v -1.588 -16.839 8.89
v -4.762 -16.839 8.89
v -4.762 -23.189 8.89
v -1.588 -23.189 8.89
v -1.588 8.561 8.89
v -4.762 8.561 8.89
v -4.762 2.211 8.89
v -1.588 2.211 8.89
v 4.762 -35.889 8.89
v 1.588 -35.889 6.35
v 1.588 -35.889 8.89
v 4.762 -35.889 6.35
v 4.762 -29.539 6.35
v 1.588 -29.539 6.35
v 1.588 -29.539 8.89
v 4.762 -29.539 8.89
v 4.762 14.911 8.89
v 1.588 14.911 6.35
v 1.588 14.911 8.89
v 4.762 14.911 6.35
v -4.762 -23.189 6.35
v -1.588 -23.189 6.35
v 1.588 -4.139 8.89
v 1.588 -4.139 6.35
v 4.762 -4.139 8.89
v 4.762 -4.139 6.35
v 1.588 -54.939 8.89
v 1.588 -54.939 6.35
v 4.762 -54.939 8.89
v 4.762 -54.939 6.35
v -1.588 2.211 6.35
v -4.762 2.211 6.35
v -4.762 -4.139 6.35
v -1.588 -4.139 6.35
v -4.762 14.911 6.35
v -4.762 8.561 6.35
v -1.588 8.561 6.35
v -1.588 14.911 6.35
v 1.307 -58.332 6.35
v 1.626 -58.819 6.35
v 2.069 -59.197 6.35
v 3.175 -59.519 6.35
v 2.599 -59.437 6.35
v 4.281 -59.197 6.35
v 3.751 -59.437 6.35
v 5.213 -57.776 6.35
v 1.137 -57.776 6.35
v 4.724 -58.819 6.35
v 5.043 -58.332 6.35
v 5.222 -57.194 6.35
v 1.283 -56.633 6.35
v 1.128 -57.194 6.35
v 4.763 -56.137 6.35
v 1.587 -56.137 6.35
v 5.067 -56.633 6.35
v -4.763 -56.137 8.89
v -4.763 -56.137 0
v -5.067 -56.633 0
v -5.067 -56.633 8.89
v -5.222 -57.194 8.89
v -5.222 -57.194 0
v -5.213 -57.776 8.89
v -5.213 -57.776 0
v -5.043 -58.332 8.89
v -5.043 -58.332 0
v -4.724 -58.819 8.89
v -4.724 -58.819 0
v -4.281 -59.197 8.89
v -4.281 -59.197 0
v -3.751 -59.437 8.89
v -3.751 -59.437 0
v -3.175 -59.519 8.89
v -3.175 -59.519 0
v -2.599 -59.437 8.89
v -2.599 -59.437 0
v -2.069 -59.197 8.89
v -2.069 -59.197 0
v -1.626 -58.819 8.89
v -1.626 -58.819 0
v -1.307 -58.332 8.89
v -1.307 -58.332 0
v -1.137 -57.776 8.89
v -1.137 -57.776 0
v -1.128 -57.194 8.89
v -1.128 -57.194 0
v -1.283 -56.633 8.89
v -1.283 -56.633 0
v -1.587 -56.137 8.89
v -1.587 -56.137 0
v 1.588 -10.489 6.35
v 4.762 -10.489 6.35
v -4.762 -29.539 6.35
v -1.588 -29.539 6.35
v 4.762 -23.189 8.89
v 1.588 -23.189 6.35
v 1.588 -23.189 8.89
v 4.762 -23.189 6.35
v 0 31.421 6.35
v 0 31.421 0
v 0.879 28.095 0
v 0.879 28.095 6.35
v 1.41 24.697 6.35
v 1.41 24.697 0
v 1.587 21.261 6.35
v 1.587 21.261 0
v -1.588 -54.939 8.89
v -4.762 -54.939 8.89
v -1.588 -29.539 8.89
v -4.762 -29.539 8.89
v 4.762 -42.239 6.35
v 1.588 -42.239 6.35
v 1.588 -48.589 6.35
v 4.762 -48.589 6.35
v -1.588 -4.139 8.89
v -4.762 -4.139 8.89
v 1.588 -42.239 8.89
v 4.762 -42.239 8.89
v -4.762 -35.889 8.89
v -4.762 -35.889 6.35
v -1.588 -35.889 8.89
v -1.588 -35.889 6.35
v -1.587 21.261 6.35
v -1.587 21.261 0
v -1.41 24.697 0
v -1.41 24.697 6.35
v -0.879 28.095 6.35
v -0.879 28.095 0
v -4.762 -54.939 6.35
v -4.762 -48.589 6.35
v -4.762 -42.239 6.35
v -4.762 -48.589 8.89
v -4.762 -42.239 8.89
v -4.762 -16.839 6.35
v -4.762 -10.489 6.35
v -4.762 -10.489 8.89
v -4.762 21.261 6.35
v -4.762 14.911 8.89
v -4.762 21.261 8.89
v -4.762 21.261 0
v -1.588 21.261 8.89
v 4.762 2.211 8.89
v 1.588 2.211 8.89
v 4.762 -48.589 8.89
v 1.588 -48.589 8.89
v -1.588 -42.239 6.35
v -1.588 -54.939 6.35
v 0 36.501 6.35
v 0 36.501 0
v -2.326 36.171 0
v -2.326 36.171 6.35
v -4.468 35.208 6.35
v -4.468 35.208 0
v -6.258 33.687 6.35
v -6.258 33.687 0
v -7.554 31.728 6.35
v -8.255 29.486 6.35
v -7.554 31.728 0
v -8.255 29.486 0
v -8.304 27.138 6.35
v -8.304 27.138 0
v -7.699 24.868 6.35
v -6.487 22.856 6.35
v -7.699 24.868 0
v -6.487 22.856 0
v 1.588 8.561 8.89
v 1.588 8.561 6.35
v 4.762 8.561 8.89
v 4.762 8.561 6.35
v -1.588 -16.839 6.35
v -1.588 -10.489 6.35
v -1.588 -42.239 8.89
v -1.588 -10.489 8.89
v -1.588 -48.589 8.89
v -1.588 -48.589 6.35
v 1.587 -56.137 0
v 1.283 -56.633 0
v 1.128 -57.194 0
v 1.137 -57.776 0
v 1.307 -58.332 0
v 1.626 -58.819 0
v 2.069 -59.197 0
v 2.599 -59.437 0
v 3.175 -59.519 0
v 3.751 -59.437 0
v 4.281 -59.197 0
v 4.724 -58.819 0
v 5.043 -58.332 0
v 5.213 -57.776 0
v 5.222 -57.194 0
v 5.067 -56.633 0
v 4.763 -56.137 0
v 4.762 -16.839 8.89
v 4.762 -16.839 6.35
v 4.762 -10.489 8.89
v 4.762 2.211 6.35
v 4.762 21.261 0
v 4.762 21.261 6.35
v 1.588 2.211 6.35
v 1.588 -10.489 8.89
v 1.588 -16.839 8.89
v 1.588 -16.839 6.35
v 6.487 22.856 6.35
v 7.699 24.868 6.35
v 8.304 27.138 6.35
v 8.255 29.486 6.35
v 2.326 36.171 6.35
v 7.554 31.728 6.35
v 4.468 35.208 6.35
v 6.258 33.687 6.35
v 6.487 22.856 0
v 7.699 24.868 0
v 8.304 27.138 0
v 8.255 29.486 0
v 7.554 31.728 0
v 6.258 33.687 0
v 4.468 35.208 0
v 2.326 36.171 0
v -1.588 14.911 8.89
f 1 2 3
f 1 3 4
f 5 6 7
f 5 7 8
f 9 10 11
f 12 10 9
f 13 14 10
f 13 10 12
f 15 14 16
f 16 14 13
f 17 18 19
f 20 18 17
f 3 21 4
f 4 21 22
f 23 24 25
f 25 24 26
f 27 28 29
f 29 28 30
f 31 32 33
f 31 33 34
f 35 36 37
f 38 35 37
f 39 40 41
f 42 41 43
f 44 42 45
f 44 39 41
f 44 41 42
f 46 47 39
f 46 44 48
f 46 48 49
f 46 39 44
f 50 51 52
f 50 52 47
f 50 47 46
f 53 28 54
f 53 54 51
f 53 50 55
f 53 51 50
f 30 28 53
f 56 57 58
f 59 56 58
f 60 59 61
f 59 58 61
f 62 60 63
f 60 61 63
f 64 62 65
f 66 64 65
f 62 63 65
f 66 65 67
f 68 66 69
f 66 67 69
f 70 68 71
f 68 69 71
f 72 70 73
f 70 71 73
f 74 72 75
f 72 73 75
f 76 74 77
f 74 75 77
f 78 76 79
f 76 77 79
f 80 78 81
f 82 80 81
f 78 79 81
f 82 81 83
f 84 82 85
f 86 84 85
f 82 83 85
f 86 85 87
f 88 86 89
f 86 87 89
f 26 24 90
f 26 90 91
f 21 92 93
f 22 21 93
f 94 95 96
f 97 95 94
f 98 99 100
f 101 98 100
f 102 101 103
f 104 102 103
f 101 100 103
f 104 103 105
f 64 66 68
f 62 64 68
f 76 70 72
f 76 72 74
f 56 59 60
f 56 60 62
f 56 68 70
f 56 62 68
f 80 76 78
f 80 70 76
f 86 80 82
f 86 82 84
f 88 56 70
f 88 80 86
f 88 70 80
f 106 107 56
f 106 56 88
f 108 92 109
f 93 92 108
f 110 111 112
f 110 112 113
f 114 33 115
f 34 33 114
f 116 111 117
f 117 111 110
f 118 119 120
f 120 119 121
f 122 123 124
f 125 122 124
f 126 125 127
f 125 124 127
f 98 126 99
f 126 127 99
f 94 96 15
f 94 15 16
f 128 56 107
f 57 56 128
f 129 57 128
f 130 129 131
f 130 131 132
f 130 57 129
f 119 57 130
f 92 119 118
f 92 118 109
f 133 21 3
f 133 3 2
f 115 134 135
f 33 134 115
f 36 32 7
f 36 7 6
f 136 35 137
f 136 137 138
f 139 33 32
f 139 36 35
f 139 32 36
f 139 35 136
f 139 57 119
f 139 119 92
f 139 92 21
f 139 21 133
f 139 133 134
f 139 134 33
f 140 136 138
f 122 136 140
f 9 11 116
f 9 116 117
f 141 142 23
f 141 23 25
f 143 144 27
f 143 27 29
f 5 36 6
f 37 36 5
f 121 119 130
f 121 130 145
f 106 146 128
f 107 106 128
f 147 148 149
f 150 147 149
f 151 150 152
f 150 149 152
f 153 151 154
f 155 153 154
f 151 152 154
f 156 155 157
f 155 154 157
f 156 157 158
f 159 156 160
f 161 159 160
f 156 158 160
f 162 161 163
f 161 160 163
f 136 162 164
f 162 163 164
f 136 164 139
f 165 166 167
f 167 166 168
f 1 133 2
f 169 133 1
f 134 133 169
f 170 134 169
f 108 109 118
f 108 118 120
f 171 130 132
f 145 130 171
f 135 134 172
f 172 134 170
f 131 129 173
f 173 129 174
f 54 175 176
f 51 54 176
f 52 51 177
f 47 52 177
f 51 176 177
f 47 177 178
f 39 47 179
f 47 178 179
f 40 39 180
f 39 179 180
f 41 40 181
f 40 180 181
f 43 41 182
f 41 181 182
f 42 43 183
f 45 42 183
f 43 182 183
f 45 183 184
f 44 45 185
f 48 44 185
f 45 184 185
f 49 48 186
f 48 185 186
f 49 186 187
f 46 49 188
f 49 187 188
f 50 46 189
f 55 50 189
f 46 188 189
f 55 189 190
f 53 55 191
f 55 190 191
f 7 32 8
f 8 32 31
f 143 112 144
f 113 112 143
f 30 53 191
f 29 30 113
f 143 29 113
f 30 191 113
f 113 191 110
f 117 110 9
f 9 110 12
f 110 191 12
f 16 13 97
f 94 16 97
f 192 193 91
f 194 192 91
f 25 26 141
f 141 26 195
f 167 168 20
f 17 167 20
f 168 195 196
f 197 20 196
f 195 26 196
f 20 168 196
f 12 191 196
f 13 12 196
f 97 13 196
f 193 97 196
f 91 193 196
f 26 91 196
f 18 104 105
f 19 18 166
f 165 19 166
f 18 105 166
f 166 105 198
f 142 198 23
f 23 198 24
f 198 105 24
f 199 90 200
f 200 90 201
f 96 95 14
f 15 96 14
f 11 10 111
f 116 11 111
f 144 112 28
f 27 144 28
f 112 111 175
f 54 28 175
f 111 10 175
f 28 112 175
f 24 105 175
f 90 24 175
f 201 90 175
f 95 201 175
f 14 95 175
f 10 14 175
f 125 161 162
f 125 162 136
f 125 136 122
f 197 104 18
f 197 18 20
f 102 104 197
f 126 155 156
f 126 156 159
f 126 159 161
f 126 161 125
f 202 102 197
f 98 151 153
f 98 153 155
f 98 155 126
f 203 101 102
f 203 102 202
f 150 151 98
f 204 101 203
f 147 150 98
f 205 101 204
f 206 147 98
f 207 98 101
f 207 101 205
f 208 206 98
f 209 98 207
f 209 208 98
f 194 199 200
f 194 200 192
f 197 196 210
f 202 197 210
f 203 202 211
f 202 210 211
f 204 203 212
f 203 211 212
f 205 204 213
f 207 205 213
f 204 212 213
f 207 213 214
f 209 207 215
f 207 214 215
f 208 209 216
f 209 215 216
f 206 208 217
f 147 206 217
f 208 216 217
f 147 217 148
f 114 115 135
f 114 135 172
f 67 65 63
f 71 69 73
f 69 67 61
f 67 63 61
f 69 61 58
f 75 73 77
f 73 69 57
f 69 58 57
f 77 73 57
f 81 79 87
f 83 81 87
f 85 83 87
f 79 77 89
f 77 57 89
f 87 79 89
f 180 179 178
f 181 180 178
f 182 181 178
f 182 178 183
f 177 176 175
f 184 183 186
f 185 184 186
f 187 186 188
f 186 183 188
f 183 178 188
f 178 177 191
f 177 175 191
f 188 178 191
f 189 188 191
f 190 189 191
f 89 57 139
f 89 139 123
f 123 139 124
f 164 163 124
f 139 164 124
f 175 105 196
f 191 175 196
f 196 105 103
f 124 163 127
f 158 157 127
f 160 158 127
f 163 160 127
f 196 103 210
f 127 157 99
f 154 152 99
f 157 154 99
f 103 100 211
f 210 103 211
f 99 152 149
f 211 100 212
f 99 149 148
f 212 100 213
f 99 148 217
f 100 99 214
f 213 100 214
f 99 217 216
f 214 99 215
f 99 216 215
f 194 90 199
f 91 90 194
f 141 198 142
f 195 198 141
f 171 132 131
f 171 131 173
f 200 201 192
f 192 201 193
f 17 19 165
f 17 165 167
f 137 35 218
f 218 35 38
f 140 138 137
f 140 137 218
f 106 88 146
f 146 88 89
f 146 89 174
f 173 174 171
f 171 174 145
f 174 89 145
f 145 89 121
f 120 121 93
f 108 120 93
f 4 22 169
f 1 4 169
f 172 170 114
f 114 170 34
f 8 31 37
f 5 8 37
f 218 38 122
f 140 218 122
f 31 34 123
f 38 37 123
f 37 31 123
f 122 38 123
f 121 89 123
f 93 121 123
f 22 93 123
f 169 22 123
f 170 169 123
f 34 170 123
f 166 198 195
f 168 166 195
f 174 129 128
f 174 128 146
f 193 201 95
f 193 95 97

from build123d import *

# Parameters (mm, degrees)
F1_DEPTH = 6.35
F2_W     = 3.175
F2_H     = 6.35
F2_H_2   = 6.349999
F2_H_3   = 6.350001
F3_DEPTH = 2.54


with BuildPart() as f1:
    # F0 (on Top) → F1 (new body)
    with BuildSketch(Plane.XY):
        with BuildLine():
            Line((0, 36.501117), (0, 31.421117))
            ThreePointArc((0, 31.421117), (1.188232, 26.402755), (1.5875, 21.261117))
            Line((1.5875, 21.261117), (1.5875, -56.137312))
            ThreePointArc((1.5875, -56.137312), (3.175, -59.518786), (4.7625, -56.137312))
            Line((4.7625, -56.137312), (4.7625, 21.261117))
            ThreePointArc((4.7625, 21.261117), (7.983405, 30.631791), (0, 36.501117))
        make_face()
        with BuildLine():
            ThreePointArc((-1.5875, 21.261117), (-1.188232, 26.402755), (0, 31.421117))
            Line((0, 31.421117), (0, 36.501117))
            ThreePointArc((0, 36.501117), (-7.983405, 30.631791), (-4.7625, 21.261117))
            Line((-4.7625, 21.261117), (-4.7625, -56.137312))
            ThreePointArc((-4.7625, -56.137312), (-3.175, -59.518786), (-1.5875, -56.137312))
            Line((-1.5875, -56.137312), (-1.5875, 21.261117))
        make_face()
    extrude(amount=F1_DEPTH)

    # F2 (on face) → F3 (join)
    with BuildSketch(Plane.XY.offset(6.35)):
        with Locations((-3.175, 18.086117)):
            Rectangle(F2_W, F2_H)
        with Locations((3.175, 11.736117)):
            Rectangle(F2_W, F2_H)
        with Locations((-3.175, 5.386117)):
            Rectangle(F2_W, F2_H)
        with Locations((3.175, -0.963883)):
            Rectangle(F2_W, F2_H)
        with Locations((-3.175, -7.313883)):
            Rectangle(F2_W, F2_H)
        with Locations((3.175, -13.663883)):
            Rectangle(F2_W, F2_H)
        with Locations((-3.175, -20.013883)):
            Rectangle(F2_W, F2_H)
        with Locations((3.175, -26.363883)):
            Rectangle(F2_W, F2_H)
        with Locations((-3.175, -32.713883)):
            Rectangle(F2_W, F2_H)
        with Locations((3.175, -39.063883)):
            Rectangle(F2_W, F2_H)
        with Locations((-3.175, -45.413882)):
            Rectangle(F2_W, F2_H_2)
        with Locations((3.175, -51.763882)):
            Rectangle(F2_W, F2_H_3)
        with BuildLine():
            Line((-1.5875, -56.137312), (-1.5875, -54.938883))
            Line((-1.5875, -54.938883), (-4.7625, -54.938883))
            Line((-4.7625, -54.938883), (-4.7625, -56.137312))
            ThreePointArc((-4.7625, -56.137312), (-3.175, -59.518786), (-1.5875, -56.137312))
        make_face()
    extrude(amount=F3_DEPTH)


solid = f1.part
